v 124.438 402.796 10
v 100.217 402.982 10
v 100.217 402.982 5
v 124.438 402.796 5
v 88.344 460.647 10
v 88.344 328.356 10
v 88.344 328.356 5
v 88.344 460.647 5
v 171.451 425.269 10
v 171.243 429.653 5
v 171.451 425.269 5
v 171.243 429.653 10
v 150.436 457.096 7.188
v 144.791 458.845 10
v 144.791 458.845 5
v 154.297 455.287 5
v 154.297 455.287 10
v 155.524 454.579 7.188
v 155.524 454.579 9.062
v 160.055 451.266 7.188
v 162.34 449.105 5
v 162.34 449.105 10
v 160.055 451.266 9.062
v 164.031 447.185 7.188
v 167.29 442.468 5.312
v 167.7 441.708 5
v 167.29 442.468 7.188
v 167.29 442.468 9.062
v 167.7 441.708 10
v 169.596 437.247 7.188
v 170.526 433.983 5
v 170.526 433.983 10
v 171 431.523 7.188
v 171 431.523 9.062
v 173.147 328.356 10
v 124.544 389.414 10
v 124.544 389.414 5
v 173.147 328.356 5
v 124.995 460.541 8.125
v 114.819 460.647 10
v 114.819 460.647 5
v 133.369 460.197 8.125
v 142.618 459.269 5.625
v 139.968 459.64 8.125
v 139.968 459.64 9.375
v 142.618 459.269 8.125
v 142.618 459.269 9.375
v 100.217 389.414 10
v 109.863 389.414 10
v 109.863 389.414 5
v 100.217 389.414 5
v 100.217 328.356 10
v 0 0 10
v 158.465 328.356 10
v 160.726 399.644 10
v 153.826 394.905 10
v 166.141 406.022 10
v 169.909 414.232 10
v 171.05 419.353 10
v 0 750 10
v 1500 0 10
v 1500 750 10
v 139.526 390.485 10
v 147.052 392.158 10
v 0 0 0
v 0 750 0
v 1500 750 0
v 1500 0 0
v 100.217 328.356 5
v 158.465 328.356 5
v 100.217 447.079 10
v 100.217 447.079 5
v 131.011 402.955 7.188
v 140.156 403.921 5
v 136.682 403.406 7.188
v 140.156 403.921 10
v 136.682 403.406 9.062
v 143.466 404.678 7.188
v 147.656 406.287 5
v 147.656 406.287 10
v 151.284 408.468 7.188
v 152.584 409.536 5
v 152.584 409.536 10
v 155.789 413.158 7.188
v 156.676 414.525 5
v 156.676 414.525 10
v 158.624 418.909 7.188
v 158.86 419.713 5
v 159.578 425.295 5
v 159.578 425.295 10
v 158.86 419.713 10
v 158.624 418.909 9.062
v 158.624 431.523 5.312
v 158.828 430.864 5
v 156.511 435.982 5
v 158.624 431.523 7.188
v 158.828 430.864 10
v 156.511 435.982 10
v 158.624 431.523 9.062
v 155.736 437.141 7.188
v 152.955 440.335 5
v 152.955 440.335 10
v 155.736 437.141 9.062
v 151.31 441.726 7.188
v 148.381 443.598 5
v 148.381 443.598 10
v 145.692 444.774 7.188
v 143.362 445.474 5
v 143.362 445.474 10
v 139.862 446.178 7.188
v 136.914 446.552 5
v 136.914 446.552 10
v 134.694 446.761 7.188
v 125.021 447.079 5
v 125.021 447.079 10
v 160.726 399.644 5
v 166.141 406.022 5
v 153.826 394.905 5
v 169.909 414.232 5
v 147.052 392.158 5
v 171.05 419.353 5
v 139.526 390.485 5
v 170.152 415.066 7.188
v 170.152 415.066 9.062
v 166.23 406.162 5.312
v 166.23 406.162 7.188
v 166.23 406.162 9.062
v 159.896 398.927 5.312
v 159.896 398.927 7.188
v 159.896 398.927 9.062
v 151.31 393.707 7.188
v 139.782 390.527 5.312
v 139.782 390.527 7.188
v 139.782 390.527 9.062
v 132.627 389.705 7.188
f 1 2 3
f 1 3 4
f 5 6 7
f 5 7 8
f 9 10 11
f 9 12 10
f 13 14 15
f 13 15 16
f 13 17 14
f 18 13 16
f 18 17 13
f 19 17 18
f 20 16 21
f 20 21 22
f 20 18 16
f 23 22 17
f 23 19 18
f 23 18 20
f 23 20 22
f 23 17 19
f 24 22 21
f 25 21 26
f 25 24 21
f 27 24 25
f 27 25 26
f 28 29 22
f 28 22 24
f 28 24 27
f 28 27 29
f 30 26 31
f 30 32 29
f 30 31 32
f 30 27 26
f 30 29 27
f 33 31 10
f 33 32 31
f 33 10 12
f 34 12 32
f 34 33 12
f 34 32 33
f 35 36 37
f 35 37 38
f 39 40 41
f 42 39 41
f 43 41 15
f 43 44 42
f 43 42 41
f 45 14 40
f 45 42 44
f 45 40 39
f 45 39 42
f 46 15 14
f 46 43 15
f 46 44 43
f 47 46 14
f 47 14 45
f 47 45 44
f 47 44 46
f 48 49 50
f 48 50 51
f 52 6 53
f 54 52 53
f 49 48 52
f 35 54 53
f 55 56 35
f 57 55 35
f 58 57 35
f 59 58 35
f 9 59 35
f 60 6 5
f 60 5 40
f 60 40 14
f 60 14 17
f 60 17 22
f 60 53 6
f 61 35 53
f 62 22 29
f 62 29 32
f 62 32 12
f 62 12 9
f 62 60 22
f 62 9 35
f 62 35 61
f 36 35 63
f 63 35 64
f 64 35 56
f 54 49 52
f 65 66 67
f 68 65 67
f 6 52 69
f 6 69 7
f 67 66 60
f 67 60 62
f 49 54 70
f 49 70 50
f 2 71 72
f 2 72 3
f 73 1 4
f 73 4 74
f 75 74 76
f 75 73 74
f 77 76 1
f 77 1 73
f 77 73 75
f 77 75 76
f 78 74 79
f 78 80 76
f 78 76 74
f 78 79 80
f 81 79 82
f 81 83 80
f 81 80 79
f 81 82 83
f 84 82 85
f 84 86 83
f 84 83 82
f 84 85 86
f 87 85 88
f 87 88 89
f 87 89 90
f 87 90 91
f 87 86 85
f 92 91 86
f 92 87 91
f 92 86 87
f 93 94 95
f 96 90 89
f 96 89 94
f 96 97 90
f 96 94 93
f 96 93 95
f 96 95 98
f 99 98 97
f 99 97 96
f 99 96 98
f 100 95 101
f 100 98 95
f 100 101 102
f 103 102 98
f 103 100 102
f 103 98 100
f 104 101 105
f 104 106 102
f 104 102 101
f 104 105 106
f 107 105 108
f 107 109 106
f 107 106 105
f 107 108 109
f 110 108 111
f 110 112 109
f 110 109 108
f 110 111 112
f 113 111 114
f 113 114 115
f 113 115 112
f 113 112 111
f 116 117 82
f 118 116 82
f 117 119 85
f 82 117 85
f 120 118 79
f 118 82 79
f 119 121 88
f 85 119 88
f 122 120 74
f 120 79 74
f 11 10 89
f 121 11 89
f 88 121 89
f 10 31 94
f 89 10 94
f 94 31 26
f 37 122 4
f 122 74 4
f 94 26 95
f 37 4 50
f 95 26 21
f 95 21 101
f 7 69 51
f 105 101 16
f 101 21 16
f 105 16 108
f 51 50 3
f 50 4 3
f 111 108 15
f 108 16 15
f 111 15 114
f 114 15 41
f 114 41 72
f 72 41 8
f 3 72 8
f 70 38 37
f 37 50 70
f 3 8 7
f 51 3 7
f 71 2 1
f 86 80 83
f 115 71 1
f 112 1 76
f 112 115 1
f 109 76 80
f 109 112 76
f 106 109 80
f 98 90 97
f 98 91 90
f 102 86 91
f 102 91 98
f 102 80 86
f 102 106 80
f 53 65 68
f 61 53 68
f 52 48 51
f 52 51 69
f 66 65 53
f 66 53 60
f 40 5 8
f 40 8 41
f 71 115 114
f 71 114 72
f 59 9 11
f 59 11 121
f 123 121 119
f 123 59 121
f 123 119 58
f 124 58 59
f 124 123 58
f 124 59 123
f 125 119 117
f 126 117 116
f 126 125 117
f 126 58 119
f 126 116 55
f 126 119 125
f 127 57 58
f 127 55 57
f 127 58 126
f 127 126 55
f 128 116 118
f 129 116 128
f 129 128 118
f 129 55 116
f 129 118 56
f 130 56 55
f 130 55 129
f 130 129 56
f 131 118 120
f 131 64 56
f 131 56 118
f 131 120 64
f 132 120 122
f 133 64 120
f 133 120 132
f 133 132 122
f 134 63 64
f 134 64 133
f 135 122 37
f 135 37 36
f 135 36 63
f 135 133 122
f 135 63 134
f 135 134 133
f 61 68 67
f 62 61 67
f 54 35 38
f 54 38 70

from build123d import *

# Parameters (mm, degrees)
SKETCH1_W           = 1500
SKETCH1_H           = 750
BOSS_EXTRUDE1_DEPTH = 10
CUT_EXTRUDE1_DEPTH  = 5


with BuildPart() as part:
    # Sketch1 → Boss-Extrude1 (new body)
    with BuildSketch(Plane.XY):
        with Locations((750, 375)):
            Rectangle(SKETCH1_W, SKETCH1_H)
    extrude(amount=BOSS_EXTRUDE1_DEPTH)

    # Sketch2 → Cut-Extrude1 (cut)
    with BuildSketch(Plane.XY.offset(10)):
        with BuildLine():
            Line((88.344425578, 460.647477035), (114.818659352, 460.647477035))
            add(Edge.make_bspline(
                [(114.818659352, 460.647477035), (116.585362721, 460.641596255), (119.977628894, 460.630304506), (124.837392387, 460.567342634), (129.253178494, 460.386883356), (133.222678373, 460.231588683), (136.745819201, 459.948411139), (139.833404297, 459.677755727), (142.471213102, 459.323453668), (144.068005696, 458.994409407), (144.790990081, 458.845427088)],
                knots=[0, 0, 0, 0, 1.410062039, 2.707475311, 3.878576406, 4.937260626, 5.877586885, 6.699081471, 7.410979367, 8, 8, 8, 8], degree=3))
            add(Edge.make_bspline(
                [(144.790990081, 458.845427088), (145.758859505, 458.606290421), (147.673951072, 458.133118521), (150.431289877, 457.133008609), (153.058765813, 455.975659702), (155.545464529, 454.616316702), (157.878930446, 453.044889018), (160.083223741, 451.288504629), (162.168346911, 449.356773934), (164.049974004, 447.200992723), (165.824158398, 444.939315125), (167.320514221, 442.493667173), (168.610413901, 439.936222531), (169.637394752, 437.240971919), (170.464330059, 434.434053757), (171.047405178, 431.49004269), (171.397078044, 428.422351072), (171.432677942, 426.329953925), (171.450728997, 425.268996466)],
                knots=[0, 0, 0, 0, 1.027469482, 2.033020251, 3.019912614, 3.986113645, 4.951240523, 5.91722682, 6.890402269, 7.87763091, 8.8651537, 9.85103654, 10.82876324, 11.815024772, 12.821070561, 13.842952187, 14.906261191, 16, 16, 16, 16], degree=3))
            add(Edge.make_bspline(
                [(171.450728997, 425.268996466), (171.395204366, 423.506300548), (171.28686143, 420.066824261), (170.276716142, 415.075237375), (168.622067926, 410.418974589), (166.341991228, 406.103898692), (163.43839795, 402.214121323), (159.948740667, 398.797577328), (155.871072614, 395.938568727), (152.075083589, 393.955977597), (148.721898064, 392.686245634), (145.96141273, 391.792847546), (142.950190664, 391.102588739), (139.717083076, 390.484214711), (136.248635383, 390.017350071), (132.55316068, 389.67541034), (128.628023401, 389.461700761), (125.931576435, 389.429874981), (124.544428917, 389.413502676)],
                knots=[0, 0, 0, 0, 1.260483769, 2.459530307, 3.627416485, 4.787058657, 5.939039949, 7.08810263, 8.267026773, 9.491475466, 10.141966685, 10.831826277, 11.566392101, 12.351337768, 13.187381173, 14.07005841, 15.007169909, 16, 16, 16, 16], degree=3))
            Line((124.544428917, 389.413502676), (173.146776005, 328.355810368))
            Line((173.146776005, 328.355810368), (158.465369088, 328.355810368))
            Line((158.465369088, 328.355810368), (109.863021999, 389.413502676))
            Line((109.863021999, 389.413502676), (100.216754638, 389.413502676))
            Line((100.216754638, 389.413502676), (100.216754638, 328.355810368))
            Line((100.216754638, 328.355810368), (88.344425578, 328.355810368))
            Line((88.344425578, 328.355810368), (88.344425578, 460.647477035))
        make_face()
        with BuildLine():
            Line((100.216754638, 447.079100967), (100.216754638, 402.981878744))
            Line((100.216754638, 402.981878744), (124.438425979, 402.796373603))
            add(Edge.make_bspline(
                [(124.438425979, 402.796373603), (125.569332212, 402.795873289), (127.761350591, 402.794903538), (130.932595957, 402.945858771), (133.885350179, 403.117585383), (136.608319085, 403.380254098), (139.102719105, 403.718772285), (141.367303474, 404.142218416), (143.405768828, 404.635555308), (145.783183822, 405.399128664), (148.437957478, 406.60887995), (151.323104919, 408.36894493), (153.780038519, 410.582718184), (155.855802957, 413.114155362), (157.523790397, 415.897430244), (158.699751974, 418.899179913), (159.445969287, 422.043624243), (159.533982761, 424.204820581), (159.578399937, 425.295497201)],
                knots=[0, 0, 0, 0, 1.146690395, 2.22261258, 3.21895312, 4.145990853, 4.996080663, 5.770904154, 6.481378293, 7.121626537, 8.300444488, 9.431385265, 10.535395872, 11.636531494, 12.74115979, 13.810798291, 14.895190096, 16, 16, 16, 16], degree=3))
            add(Edge.make_bspline(
                [(159.578399937, 425.295497201), (159.532962622, 426.359370672), (159.442922444, 428.467579693), (158.7078053, 431.553978683), (157.464664993, 434.466925906), (155.789389928, 437.194571618), (153.74835044, 439.670532467), (151.355087877, 441.788981407), (148.675040322, 443.537101054), (146.170146813, 444.65418627), (143.931234615, 445.33907358), (141.987315917, 445.821037213), (139.790840419, 446.208253746), (137.331143025, 446.518498905), (134.618724243, 446.785159), (131.639869276, 446.964764919), (128.414342165, 447.071122283), (126.178728992, 447.076379511), (125.021442138, 447.079100967)],
                knots=[0, 0, 0, 0, 1.101028733, 2.181837193, 3.264309656, 4.369019818, 5.486613113, 6.575447106, 7.666700264, 8.788928104, 9.402425223, 10.0903467, 10.862060571, 11.710948788, 12.657782767, 13.684531032, 14.801375019, 16, 16, 16, 16], degree=3))
            Line((125.021442138, 447.079100967), (100.216754638, 447.079100967))
        make_face(mode=Mode.SUBTRACT)
    extrude(amount=-CUT_EXTRUDE1_DEPTH, mode=Mode.SUBTRACT)


solid = part.part
